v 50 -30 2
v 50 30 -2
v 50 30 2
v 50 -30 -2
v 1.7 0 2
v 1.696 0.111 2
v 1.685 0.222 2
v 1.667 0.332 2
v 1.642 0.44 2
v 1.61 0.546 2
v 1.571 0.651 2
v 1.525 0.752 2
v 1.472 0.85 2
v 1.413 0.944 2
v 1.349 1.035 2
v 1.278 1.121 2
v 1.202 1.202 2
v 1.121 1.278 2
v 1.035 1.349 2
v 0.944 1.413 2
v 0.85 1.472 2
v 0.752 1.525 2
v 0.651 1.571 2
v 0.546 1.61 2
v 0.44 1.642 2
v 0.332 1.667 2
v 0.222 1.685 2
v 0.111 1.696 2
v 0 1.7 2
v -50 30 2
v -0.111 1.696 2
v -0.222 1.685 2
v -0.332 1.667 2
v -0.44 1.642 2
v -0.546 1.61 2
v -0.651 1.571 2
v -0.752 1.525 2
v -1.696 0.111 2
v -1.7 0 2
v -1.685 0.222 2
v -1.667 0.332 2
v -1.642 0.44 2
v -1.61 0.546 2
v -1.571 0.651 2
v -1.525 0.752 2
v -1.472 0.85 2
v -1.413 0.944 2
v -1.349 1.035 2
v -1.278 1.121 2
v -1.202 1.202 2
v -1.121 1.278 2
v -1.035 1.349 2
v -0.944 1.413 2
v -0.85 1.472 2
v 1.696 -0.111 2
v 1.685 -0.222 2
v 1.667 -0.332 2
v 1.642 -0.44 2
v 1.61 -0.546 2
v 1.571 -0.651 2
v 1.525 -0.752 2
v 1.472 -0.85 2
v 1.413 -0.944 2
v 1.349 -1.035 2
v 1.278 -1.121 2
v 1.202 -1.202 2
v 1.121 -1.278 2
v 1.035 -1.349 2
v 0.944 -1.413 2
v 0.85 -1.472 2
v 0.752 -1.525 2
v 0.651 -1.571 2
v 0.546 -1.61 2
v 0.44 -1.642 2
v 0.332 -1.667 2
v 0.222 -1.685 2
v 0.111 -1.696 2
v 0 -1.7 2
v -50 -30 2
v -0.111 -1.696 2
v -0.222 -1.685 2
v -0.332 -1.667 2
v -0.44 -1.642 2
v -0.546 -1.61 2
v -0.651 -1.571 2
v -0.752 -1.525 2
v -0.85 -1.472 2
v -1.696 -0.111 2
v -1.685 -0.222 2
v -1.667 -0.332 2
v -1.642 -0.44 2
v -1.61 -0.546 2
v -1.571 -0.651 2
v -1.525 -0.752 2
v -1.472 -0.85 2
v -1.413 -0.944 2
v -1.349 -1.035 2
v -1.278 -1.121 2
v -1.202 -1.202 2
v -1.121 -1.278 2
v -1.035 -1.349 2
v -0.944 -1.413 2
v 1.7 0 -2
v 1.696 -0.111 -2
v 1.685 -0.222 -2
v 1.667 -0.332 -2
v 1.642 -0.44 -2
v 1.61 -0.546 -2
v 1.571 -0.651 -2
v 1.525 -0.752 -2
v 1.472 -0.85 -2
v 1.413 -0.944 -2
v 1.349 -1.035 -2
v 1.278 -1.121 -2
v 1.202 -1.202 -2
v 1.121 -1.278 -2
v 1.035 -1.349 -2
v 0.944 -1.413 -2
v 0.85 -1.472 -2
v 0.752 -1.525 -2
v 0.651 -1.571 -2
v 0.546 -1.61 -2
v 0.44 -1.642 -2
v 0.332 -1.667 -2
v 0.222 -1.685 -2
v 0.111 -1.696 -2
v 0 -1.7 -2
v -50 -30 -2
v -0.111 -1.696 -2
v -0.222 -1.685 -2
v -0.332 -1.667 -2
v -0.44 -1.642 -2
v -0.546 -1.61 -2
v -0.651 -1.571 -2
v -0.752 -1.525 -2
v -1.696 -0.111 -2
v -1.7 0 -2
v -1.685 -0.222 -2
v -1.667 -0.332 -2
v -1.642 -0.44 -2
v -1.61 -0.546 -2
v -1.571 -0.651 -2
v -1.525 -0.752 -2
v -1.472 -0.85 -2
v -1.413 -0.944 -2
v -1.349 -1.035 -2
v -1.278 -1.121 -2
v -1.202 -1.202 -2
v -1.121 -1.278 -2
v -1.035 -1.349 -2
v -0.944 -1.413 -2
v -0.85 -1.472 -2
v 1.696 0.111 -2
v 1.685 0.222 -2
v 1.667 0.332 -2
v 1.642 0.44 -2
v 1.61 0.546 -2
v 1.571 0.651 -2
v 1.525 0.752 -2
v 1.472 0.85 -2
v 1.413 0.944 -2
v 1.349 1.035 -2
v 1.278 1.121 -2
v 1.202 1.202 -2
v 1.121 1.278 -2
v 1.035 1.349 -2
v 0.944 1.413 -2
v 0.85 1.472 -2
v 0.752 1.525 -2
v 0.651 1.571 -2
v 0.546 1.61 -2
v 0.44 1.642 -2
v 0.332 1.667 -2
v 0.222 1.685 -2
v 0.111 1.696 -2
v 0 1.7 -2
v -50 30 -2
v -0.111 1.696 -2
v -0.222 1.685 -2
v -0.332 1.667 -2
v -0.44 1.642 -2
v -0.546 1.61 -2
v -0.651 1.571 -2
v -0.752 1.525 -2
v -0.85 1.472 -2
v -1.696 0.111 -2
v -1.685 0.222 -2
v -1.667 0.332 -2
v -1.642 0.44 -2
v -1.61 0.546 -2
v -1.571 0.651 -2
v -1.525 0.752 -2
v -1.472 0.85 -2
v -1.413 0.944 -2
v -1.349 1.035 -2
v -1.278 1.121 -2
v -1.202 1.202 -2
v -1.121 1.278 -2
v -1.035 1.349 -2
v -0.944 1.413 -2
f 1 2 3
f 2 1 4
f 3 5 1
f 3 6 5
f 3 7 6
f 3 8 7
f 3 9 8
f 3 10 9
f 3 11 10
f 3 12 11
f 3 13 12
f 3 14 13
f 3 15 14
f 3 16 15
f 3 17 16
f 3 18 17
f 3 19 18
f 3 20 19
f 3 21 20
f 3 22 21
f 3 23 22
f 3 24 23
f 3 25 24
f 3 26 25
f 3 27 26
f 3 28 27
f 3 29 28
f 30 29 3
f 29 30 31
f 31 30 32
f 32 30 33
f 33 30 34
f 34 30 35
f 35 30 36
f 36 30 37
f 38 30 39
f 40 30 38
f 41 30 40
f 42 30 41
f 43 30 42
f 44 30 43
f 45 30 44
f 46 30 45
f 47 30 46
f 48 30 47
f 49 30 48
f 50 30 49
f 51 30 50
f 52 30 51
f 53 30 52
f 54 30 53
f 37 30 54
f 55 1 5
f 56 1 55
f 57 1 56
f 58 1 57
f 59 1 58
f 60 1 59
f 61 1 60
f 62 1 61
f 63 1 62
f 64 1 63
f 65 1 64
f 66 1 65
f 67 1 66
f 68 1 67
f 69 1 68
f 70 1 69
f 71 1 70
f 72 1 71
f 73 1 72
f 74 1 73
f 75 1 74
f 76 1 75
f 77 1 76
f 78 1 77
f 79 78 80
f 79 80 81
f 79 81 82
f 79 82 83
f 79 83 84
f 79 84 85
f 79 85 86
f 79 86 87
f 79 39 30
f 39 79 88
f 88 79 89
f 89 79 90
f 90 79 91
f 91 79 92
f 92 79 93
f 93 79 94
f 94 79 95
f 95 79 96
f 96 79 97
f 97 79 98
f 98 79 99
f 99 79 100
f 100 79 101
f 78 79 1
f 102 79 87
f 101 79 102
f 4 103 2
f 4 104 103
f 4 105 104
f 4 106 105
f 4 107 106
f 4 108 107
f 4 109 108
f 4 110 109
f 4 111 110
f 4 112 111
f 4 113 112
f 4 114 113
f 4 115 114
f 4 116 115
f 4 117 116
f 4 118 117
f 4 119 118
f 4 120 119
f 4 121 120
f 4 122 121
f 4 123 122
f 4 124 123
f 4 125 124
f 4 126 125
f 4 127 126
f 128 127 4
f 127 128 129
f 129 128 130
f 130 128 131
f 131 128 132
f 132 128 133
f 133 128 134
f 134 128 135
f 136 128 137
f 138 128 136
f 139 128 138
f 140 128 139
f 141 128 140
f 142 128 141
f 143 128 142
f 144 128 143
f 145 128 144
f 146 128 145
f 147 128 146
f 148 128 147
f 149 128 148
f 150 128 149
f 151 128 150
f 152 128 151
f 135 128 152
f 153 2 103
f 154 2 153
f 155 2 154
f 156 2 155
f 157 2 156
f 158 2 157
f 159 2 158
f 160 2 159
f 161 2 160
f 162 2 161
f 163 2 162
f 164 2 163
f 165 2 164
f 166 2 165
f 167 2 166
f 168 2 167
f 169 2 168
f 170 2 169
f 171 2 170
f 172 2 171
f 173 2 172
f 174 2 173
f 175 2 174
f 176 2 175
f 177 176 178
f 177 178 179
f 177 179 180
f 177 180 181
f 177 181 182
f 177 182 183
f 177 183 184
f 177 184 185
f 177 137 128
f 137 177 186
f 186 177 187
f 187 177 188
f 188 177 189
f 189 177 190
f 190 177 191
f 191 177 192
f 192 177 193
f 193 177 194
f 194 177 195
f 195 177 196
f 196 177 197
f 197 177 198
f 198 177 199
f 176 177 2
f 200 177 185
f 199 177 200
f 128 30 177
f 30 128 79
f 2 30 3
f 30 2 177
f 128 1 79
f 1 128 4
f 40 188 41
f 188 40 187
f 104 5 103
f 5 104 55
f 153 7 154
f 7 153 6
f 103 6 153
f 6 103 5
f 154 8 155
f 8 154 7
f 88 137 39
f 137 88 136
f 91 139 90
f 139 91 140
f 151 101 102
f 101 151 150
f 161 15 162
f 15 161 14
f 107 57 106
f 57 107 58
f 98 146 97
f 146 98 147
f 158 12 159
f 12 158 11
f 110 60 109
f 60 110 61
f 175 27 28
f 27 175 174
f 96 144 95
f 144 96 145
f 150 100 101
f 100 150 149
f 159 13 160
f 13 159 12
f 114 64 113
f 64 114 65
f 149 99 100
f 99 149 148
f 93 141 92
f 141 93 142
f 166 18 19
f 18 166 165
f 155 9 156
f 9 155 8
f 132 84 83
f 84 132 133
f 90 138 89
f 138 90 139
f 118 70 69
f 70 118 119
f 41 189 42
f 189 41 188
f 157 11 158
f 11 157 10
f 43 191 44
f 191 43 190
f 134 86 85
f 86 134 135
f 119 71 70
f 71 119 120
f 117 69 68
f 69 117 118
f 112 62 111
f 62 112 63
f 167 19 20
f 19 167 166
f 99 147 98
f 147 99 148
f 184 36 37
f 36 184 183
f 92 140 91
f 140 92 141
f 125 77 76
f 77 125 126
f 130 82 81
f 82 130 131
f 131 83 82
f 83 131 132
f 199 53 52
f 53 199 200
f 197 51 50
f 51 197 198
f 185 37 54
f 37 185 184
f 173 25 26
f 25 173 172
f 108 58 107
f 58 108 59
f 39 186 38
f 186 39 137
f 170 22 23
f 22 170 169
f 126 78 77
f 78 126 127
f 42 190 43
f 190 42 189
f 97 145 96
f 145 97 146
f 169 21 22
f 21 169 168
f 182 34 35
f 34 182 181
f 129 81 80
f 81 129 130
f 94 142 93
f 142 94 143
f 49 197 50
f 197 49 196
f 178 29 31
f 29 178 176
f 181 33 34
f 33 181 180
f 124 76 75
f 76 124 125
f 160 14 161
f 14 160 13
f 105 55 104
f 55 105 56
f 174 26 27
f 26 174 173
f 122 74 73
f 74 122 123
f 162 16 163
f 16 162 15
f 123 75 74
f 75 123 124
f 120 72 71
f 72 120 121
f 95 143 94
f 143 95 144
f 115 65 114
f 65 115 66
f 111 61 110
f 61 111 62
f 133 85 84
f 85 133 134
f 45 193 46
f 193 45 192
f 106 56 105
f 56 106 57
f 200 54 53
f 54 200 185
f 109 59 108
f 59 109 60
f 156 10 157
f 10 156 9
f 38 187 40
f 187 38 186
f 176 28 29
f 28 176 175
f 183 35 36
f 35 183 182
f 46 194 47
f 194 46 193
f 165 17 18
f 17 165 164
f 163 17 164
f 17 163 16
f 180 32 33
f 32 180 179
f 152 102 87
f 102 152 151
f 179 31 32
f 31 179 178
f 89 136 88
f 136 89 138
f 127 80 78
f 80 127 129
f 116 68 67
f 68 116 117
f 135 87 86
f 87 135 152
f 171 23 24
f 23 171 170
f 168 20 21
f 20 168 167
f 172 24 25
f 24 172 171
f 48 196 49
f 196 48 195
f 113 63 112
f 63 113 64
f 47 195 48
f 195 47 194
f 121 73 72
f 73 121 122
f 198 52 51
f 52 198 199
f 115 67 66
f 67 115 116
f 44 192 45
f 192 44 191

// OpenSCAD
render_fn = 96;
$fn = render_fn;
set = "__PLAMP_PART__"; // [__PLAMP_PART__, assembly]

part_w = 100;
part_d = 60;
part_h = 4;
boolean_overlap = 0.1;

module __PLAMP_PART___positive() {
    cube([part_w, part_d, part_h], center = true);
}

module __PLAMP_PART___negative() {
    echo("BOM", "M3x16 screw", 1);
    cylinder(d = 3.4, h = part_h + 2 * boolean_overlap, center = true);
}

module __PLAMP_PART__() {
    difference() {
        __PLAMP_PART___positive();
        __PLAMP_PART___negative();
    }
}

if (set == "__PLAMP_PART__") {
    __PLAMP_PART__();
} else if (set == "assembly") {
    __PLAMP_PART__();
}
